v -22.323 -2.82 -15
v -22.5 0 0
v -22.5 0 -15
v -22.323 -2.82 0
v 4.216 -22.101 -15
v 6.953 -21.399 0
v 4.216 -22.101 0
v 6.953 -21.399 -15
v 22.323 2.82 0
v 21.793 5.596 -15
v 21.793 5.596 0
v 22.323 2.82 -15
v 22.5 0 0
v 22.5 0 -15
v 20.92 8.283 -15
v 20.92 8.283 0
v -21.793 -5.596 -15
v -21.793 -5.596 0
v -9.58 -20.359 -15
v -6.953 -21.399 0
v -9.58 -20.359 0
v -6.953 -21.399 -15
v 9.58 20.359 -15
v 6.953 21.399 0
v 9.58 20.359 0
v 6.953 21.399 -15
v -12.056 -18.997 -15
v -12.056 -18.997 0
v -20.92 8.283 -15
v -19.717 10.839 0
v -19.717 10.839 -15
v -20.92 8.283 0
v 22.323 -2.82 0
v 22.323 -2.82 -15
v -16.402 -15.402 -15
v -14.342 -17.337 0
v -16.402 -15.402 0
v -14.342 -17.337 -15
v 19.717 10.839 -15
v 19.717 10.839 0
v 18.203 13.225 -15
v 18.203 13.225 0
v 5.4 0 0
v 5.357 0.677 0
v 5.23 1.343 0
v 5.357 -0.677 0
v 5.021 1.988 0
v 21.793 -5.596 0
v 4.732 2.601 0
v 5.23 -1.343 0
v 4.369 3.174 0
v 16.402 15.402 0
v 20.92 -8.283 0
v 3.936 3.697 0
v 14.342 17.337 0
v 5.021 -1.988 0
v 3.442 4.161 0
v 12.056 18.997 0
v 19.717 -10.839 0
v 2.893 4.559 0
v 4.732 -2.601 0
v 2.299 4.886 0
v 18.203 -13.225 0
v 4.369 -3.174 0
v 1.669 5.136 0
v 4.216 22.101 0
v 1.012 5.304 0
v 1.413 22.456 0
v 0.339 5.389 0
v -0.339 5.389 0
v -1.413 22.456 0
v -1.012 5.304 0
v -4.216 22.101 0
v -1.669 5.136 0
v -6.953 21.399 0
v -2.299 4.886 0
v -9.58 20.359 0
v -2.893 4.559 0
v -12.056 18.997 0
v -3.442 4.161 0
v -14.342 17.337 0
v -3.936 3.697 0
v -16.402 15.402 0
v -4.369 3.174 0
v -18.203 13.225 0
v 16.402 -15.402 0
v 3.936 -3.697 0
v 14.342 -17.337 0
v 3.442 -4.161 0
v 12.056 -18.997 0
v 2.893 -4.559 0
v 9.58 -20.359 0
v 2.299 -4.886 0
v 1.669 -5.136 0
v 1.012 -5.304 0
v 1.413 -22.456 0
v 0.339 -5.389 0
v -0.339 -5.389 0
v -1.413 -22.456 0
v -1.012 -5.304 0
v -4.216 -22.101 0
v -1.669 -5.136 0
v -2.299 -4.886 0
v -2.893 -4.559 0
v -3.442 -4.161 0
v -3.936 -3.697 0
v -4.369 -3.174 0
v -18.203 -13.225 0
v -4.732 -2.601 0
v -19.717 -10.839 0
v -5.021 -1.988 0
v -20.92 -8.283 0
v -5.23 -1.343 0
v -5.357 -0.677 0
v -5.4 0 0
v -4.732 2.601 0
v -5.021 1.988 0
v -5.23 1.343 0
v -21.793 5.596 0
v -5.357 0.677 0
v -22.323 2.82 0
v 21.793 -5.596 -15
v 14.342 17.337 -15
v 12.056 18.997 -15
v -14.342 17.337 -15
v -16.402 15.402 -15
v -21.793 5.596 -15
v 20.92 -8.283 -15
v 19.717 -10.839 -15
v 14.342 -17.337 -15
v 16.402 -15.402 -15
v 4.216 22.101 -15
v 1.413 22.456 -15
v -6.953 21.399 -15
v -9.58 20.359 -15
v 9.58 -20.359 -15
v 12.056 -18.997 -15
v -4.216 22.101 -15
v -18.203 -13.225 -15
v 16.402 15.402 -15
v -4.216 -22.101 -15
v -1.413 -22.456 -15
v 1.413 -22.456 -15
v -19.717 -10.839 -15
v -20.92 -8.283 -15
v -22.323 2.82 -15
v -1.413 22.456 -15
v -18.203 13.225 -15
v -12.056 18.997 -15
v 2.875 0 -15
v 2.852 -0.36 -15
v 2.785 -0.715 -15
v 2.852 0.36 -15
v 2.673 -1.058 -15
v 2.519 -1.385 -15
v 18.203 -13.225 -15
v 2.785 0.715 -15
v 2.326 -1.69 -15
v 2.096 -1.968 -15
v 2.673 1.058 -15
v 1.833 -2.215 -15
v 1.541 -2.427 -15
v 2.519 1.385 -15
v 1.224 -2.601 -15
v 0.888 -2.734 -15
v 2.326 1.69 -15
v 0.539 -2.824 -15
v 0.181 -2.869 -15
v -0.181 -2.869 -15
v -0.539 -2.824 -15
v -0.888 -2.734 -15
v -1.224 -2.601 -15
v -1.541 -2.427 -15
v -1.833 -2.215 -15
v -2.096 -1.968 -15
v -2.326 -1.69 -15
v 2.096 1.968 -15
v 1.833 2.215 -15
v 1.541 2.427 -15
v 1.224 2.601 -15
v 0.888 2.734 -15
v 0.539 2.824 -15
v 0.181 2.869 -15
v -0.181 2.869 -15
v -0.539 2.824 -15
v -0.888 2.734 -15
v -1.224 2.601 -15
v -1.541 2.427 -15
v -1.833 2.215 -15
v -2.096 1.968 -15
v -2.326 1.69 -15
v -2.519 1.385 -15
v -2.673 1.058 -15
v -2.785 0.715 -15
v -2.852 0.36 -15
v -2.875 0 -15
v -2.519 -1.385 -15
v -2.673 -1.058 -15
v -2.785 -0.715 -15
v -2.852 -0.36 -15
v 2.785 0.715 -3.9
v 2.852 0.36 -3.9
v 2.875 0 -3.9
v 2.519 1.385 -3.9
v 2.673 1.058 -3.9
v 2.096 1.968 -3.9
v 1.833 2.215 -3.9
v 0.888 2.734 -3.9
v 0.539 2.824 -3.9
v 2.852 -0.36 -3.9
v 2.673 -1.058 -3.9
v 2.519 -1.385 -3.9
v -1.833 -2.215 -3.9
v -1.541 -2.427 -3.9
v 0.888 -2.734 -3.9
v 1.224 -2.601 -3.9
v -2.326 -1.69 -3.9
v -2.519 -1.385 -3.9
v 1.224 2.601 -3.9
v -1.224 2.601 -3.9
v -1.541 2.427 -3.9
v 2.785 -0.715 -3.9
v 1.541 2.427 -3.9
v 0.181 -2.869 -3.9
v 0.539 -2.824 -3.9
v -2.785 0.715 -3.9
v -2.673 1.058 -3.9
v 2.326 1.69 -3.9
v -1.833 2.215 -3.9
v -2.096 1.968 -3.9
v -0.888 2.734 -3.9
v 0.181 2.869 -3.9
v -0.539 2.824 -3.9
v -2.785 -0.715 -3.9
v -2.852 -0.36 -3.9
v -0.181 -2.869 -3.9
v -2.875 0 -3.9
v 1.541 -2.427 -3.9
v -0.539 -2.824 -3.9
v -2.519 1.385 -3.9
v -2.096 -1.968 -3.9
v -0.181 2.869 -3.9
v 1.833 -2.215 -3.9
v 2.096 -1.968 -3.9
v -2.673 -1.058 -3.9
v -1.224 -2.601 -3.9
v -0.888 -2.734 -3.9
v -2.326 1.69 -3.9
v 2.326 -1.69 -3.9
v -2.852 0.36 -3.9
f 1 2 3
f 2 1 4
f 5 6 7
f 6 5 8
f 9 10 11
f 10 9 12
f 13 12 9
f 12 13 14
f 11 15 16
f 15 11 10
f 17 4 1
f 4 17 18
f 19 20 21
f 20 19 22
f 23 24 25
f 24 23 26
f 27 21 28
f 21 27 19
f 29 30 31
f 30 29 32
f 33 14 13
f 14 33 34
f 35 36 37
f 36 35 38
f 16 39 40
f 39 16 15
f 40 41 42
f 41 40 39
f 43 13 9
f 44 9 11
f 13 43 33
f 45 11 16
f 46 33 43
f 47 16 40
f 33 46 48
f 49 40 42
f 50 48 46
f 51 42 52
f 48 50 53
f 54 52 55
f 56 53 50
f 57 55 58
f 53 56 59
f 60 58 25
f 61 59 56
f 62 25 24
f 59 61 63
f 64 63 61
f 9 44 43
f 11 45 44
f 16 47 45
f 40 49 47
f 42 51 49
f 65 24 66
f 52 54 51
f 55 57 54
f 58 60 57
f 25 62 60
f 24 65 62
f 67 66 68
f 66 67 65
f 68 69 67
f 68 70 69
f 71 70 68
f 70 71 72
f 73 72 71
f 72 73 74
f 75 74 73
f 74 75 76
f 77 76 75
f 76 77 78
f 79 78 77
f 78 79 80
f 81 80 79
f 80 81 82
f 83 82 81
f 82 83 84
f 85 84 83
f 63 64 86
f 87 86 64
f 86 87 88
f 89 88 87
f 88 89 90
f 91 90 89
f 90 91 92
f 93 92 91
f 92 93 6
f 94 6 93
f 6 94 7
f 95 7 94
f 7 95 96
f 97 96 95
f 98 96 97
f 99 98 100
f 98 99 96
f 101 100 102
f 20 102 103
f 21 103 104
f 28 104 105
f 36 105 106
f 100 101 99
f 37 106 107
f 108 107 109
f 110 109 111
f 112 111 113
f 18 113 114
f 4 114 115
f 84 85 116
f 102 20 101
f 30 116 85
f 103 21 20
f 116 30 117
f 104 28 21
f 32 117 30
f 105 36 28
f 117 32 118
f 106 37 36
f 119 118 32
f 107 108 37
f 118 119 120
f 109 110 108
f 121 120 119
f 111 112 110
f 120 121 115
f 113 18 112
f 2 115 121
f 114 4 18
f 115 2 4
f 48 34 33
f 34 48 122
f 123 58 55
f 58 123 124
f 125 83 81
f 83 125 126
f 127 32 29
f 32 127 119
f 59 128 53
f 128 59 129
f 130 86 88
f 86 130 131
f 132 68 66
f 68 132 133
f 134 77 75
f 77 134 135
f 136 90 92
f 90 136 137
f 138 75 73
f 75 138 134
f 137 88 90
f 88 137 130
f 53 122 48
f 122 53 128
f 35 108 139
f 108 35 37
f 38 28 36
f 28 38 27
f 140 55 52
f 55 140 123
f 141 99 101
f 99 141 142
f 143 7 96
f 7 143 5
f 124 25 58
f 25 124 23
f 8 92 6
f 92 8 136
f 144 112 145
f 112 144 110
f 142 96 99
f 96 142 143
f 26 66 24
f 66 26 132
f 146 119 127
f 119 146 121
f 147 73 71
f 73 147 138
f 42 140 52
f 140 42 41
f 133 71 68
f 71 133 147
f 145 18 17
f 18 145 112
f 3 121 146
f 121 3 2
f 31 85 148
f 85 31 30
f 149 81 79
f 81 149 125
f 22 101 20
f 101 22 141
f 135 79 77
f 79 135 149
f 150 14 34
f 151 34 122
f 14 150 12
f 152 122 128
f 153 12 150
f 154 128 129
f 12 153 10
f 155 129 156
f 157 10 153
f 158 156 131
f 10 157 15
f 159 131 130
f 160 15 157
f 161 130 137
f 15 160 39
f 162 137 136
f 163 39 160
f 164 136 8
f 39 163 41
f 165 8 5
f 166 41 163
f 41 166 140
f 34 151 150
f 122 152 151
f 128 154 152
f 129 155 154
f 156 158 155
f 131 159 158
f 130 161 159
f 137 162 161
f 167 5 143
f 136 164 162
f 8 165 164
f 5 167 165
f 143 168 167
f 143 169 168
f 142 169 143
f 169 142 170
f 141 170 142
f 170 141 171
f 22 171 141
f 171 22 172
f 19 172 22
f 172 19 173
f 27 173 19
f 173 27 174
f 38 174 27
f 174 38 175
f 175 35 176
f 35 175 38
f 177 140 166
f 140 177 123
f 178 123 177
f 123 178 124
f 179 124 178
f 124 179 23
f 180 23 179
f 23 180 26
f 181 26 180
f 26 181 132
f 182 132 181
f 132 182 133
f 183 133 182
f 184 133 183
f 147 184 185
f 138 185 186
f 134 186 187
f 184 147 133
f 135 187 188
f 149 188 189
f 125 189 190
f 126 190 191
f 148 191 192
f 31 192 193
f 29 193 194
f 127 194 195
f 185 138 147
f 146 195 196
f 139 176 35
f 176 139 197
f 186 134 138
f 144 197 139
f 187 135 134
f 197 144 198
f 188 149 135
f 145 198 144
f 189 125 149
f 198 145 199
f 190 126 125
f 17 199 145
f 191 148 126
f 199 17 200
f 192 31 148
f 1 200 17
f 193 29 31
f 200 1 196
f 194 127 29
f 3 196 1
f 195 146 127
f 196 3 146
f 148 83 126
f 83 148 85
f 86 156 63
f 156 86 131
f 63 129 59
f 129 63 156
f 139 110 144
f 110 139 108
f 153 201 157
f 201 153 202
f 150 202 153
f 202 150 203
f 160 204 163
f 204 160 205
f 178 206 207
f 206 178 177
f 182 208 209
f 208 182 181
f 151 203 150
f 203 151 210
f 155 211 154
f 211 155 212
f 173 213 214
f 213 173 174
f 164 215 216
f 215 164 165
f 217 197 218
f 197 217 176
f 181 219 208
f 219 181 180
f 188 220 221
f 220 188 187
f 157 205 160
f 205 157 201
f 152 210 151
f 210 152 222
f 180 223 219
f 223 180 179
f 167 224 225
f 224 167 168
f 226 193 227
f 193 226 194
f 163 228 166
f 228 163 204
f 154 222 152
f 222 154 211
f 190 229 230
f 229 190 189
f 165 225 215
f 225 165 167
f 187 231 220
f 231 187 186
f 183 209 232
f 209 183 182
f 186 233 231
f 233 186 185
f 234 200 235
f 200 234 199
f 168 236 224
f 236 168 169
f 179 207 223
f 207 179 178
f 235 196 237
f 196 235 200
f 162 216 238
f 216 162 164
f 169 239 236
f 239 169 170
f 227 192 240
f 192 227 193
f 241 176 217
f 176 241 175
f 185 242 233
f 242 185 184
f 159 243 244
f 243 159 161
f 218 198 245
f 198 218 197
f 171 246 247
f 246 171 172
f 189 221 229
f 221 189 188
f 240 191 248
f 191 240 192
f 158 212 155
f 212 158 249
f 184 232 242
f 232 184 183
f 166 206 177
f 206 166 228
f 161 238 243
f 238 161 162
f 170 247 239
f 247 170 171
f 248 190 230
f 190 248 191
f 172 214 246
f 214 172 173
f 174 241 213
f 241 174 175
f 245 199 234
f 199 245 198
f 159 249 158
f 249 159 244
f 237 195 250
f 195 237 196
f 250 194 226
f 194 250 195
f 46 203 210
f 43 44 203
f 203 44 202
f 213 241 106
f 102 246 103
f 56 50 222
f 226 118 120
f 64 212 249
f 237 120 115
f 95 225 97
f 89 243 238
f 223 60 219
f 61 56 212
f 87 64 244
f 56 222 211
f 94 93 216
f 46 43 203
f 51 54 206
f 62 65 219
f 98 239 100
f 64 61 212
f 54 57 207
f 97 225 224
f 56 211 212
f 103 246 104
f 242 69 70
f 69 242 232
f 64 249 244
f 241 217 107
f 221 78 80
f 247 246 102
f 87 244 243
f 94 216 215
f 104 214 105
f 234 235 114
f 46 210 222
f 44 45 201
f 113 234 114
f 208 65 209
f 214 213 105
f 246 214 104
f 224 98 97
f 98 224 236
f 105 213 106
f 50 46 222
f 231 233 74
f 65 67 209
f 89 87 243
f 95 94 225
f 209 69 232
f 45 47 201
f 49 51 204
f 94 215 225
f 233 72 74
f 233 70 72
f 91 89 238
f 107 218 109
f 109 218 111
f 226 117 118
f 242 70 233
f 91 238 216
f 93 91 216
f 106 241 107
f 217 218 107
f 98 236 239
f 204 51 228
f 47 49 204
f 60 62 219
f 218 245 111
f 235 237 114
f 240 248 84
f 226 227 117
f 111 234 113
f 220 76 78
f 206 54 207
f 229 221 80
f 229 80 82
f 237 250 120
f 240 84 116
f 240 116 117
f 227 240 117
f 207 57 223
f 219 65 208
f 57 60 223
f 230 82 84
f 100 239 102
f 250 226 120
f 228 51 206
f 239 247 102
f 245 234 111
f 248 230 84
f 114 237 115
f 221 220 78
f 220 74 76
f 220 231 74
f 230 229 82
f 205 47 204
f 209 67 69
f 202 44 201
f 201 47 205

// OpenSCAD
$fn = 50;

difference() {
	union() {
		translate(v = [0, 0, -15.0]) {
			cylinder(h = 15, r = 22.5);
		}
		#translate(v = [0, 0, -18.0]) {
			cylinder(h = 18, r = 2.875);
		}
	}
	union() {
		translate(v = [0, 0, 0]) {
			rotate(a = [0, 0, 0]) {
				difference() {
					union() {
						translate(v = [0, 0, -18.0]) {
							cylinder(h = 18, r = 2.6);
						}
						translate(v = [0, 0, -3.9]) {
							cylinder(h = 3.9, r1 = 2.875, r2 = 5.4);
						}
						translate(v = [0, 0, -18.0]) {
							cylinder(h = 18, r = 2.875);
						}
						translate(v = [0, 0, -18.0]) {
							cylinder(h = 18, r = 2.6);
						}
					}
					union();
				}
			}
		}
	}
}
